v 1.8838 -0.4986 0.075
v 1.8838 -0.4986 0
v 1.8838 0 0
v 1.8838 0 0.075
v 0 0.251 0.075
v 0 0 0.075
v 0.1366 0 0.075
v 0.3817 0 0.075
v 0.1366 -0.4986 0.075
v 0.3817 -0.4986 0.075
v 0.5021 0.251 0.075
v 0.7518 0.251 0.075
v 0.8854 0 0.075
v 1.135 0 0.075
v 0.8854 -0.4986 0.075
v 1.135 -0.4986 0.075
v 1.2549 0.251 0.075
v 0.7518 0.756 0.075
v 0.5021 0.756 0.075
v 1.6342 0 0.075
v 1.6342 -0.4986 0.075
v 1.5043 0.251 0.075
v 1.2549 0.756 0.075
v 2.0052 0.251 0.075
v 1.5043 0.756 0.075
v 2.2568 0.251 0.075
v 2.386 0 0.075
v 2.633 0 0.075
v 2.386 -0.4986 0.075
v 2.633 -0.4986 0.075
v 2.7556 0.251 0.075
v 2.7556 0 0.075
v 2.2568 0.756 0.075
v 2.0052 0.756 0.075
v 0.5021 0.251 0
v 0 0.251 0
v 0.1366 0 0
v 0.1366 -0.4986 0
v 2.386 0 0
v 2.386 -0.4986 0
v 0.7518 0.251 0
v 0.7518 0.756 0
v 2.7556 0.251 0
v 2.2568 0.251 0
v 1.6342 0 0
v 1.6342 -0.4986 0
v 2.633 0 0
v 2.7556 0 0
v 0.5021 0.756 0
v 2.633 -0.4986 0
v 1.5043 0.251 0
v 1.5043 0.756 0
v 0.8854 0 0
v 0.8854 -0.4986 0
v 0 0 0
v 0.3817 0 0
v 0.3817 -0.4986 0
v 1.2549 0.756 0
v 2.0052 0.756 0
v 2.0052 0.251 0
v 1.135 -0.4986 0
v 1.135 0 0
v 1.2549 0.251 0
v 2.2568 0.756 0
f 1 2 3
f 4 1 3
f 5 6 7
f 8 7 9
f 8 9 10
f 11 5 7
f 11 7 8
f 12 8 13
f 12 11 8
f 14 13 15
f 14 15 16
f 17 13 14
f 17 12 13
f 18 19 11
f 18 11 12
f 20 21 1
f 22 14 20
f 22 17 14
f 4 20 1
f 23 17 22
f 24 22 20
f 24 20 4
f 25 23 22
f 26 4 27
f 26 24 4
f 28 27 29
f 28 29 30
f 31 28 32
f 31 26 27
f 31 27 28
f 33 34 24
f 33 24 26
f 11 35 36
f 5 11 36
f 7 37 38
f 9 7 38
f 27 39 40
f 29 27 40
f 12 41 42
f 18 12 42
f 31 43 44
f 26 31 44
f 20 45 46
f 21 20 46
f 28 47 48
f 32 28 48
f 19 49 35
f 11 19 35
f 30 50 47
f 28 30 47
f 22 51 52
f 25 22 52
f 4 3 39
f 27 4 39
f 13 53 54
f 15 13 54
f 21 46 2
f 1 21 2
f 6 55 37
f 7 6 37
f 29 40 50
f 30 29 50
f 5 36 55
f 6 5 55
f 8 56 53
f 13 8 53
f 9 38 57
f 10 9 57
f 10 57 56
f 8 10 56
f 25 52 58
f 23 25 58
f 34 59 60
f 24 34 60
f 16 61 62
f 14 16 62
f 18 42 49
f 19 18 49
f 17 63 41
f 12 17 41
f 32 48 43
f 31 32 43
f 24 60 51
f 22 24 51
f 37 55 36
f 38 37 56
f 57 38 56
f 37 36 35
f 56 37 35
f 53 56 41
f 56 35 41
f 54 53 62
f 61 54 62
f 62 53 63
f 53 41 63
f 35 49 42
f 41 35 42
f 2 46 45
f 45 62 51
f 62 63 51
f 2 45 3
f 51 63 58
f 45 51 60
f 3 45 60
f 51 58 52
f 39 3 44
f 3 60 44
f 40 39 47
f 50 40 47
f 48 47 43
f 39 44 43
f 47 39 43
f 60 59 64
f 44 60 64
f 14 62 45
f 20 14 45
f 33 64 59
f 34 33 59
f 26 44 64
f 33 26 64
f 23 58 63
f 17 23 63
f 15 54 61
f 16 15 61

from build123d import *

# Parameters (mm, degrees)
F1_DEPTH = 0.075


with BuildPart() as f1:
    # F0 (on Top) → F1 (new body)
    with BuildSketch(Plane.XY):
        Polygon((0, 0.251041), (0, 0), (0.136561, 0), (0.136561, -0.498578), (0.381687, -0.498578), (0.381687, 0), (0.885391, 0), (0.885391, -0.498578), (1.135001, -0.498578), (1.135001, 0), (1.634221, 0), (1.634221, -0.498578), (1.883831, -0.498578), (1.883831, 0), (2.38604, 0), (2.38604, -0.498578), (2.633039, -0.498578), (2.633039, 0), (2.755638, 0), (2.755638, 0.251041), (2.256786, 0.251041), (2.256786, 0.755991), (2.005245, 0.755991), (2.005245, 0.251041), (1.504279, 0.251041), (1.504279, 0.755991), (1.254853, 0.755991), (1.254853, 0.251041), (0.751772, 0.251041), (0.751772, 0.755991), (0.50213, 0.755991), (0.50213, 0.251041), align=None)
    extrude(amount=F1_DEPTH)


solid = f1.part
